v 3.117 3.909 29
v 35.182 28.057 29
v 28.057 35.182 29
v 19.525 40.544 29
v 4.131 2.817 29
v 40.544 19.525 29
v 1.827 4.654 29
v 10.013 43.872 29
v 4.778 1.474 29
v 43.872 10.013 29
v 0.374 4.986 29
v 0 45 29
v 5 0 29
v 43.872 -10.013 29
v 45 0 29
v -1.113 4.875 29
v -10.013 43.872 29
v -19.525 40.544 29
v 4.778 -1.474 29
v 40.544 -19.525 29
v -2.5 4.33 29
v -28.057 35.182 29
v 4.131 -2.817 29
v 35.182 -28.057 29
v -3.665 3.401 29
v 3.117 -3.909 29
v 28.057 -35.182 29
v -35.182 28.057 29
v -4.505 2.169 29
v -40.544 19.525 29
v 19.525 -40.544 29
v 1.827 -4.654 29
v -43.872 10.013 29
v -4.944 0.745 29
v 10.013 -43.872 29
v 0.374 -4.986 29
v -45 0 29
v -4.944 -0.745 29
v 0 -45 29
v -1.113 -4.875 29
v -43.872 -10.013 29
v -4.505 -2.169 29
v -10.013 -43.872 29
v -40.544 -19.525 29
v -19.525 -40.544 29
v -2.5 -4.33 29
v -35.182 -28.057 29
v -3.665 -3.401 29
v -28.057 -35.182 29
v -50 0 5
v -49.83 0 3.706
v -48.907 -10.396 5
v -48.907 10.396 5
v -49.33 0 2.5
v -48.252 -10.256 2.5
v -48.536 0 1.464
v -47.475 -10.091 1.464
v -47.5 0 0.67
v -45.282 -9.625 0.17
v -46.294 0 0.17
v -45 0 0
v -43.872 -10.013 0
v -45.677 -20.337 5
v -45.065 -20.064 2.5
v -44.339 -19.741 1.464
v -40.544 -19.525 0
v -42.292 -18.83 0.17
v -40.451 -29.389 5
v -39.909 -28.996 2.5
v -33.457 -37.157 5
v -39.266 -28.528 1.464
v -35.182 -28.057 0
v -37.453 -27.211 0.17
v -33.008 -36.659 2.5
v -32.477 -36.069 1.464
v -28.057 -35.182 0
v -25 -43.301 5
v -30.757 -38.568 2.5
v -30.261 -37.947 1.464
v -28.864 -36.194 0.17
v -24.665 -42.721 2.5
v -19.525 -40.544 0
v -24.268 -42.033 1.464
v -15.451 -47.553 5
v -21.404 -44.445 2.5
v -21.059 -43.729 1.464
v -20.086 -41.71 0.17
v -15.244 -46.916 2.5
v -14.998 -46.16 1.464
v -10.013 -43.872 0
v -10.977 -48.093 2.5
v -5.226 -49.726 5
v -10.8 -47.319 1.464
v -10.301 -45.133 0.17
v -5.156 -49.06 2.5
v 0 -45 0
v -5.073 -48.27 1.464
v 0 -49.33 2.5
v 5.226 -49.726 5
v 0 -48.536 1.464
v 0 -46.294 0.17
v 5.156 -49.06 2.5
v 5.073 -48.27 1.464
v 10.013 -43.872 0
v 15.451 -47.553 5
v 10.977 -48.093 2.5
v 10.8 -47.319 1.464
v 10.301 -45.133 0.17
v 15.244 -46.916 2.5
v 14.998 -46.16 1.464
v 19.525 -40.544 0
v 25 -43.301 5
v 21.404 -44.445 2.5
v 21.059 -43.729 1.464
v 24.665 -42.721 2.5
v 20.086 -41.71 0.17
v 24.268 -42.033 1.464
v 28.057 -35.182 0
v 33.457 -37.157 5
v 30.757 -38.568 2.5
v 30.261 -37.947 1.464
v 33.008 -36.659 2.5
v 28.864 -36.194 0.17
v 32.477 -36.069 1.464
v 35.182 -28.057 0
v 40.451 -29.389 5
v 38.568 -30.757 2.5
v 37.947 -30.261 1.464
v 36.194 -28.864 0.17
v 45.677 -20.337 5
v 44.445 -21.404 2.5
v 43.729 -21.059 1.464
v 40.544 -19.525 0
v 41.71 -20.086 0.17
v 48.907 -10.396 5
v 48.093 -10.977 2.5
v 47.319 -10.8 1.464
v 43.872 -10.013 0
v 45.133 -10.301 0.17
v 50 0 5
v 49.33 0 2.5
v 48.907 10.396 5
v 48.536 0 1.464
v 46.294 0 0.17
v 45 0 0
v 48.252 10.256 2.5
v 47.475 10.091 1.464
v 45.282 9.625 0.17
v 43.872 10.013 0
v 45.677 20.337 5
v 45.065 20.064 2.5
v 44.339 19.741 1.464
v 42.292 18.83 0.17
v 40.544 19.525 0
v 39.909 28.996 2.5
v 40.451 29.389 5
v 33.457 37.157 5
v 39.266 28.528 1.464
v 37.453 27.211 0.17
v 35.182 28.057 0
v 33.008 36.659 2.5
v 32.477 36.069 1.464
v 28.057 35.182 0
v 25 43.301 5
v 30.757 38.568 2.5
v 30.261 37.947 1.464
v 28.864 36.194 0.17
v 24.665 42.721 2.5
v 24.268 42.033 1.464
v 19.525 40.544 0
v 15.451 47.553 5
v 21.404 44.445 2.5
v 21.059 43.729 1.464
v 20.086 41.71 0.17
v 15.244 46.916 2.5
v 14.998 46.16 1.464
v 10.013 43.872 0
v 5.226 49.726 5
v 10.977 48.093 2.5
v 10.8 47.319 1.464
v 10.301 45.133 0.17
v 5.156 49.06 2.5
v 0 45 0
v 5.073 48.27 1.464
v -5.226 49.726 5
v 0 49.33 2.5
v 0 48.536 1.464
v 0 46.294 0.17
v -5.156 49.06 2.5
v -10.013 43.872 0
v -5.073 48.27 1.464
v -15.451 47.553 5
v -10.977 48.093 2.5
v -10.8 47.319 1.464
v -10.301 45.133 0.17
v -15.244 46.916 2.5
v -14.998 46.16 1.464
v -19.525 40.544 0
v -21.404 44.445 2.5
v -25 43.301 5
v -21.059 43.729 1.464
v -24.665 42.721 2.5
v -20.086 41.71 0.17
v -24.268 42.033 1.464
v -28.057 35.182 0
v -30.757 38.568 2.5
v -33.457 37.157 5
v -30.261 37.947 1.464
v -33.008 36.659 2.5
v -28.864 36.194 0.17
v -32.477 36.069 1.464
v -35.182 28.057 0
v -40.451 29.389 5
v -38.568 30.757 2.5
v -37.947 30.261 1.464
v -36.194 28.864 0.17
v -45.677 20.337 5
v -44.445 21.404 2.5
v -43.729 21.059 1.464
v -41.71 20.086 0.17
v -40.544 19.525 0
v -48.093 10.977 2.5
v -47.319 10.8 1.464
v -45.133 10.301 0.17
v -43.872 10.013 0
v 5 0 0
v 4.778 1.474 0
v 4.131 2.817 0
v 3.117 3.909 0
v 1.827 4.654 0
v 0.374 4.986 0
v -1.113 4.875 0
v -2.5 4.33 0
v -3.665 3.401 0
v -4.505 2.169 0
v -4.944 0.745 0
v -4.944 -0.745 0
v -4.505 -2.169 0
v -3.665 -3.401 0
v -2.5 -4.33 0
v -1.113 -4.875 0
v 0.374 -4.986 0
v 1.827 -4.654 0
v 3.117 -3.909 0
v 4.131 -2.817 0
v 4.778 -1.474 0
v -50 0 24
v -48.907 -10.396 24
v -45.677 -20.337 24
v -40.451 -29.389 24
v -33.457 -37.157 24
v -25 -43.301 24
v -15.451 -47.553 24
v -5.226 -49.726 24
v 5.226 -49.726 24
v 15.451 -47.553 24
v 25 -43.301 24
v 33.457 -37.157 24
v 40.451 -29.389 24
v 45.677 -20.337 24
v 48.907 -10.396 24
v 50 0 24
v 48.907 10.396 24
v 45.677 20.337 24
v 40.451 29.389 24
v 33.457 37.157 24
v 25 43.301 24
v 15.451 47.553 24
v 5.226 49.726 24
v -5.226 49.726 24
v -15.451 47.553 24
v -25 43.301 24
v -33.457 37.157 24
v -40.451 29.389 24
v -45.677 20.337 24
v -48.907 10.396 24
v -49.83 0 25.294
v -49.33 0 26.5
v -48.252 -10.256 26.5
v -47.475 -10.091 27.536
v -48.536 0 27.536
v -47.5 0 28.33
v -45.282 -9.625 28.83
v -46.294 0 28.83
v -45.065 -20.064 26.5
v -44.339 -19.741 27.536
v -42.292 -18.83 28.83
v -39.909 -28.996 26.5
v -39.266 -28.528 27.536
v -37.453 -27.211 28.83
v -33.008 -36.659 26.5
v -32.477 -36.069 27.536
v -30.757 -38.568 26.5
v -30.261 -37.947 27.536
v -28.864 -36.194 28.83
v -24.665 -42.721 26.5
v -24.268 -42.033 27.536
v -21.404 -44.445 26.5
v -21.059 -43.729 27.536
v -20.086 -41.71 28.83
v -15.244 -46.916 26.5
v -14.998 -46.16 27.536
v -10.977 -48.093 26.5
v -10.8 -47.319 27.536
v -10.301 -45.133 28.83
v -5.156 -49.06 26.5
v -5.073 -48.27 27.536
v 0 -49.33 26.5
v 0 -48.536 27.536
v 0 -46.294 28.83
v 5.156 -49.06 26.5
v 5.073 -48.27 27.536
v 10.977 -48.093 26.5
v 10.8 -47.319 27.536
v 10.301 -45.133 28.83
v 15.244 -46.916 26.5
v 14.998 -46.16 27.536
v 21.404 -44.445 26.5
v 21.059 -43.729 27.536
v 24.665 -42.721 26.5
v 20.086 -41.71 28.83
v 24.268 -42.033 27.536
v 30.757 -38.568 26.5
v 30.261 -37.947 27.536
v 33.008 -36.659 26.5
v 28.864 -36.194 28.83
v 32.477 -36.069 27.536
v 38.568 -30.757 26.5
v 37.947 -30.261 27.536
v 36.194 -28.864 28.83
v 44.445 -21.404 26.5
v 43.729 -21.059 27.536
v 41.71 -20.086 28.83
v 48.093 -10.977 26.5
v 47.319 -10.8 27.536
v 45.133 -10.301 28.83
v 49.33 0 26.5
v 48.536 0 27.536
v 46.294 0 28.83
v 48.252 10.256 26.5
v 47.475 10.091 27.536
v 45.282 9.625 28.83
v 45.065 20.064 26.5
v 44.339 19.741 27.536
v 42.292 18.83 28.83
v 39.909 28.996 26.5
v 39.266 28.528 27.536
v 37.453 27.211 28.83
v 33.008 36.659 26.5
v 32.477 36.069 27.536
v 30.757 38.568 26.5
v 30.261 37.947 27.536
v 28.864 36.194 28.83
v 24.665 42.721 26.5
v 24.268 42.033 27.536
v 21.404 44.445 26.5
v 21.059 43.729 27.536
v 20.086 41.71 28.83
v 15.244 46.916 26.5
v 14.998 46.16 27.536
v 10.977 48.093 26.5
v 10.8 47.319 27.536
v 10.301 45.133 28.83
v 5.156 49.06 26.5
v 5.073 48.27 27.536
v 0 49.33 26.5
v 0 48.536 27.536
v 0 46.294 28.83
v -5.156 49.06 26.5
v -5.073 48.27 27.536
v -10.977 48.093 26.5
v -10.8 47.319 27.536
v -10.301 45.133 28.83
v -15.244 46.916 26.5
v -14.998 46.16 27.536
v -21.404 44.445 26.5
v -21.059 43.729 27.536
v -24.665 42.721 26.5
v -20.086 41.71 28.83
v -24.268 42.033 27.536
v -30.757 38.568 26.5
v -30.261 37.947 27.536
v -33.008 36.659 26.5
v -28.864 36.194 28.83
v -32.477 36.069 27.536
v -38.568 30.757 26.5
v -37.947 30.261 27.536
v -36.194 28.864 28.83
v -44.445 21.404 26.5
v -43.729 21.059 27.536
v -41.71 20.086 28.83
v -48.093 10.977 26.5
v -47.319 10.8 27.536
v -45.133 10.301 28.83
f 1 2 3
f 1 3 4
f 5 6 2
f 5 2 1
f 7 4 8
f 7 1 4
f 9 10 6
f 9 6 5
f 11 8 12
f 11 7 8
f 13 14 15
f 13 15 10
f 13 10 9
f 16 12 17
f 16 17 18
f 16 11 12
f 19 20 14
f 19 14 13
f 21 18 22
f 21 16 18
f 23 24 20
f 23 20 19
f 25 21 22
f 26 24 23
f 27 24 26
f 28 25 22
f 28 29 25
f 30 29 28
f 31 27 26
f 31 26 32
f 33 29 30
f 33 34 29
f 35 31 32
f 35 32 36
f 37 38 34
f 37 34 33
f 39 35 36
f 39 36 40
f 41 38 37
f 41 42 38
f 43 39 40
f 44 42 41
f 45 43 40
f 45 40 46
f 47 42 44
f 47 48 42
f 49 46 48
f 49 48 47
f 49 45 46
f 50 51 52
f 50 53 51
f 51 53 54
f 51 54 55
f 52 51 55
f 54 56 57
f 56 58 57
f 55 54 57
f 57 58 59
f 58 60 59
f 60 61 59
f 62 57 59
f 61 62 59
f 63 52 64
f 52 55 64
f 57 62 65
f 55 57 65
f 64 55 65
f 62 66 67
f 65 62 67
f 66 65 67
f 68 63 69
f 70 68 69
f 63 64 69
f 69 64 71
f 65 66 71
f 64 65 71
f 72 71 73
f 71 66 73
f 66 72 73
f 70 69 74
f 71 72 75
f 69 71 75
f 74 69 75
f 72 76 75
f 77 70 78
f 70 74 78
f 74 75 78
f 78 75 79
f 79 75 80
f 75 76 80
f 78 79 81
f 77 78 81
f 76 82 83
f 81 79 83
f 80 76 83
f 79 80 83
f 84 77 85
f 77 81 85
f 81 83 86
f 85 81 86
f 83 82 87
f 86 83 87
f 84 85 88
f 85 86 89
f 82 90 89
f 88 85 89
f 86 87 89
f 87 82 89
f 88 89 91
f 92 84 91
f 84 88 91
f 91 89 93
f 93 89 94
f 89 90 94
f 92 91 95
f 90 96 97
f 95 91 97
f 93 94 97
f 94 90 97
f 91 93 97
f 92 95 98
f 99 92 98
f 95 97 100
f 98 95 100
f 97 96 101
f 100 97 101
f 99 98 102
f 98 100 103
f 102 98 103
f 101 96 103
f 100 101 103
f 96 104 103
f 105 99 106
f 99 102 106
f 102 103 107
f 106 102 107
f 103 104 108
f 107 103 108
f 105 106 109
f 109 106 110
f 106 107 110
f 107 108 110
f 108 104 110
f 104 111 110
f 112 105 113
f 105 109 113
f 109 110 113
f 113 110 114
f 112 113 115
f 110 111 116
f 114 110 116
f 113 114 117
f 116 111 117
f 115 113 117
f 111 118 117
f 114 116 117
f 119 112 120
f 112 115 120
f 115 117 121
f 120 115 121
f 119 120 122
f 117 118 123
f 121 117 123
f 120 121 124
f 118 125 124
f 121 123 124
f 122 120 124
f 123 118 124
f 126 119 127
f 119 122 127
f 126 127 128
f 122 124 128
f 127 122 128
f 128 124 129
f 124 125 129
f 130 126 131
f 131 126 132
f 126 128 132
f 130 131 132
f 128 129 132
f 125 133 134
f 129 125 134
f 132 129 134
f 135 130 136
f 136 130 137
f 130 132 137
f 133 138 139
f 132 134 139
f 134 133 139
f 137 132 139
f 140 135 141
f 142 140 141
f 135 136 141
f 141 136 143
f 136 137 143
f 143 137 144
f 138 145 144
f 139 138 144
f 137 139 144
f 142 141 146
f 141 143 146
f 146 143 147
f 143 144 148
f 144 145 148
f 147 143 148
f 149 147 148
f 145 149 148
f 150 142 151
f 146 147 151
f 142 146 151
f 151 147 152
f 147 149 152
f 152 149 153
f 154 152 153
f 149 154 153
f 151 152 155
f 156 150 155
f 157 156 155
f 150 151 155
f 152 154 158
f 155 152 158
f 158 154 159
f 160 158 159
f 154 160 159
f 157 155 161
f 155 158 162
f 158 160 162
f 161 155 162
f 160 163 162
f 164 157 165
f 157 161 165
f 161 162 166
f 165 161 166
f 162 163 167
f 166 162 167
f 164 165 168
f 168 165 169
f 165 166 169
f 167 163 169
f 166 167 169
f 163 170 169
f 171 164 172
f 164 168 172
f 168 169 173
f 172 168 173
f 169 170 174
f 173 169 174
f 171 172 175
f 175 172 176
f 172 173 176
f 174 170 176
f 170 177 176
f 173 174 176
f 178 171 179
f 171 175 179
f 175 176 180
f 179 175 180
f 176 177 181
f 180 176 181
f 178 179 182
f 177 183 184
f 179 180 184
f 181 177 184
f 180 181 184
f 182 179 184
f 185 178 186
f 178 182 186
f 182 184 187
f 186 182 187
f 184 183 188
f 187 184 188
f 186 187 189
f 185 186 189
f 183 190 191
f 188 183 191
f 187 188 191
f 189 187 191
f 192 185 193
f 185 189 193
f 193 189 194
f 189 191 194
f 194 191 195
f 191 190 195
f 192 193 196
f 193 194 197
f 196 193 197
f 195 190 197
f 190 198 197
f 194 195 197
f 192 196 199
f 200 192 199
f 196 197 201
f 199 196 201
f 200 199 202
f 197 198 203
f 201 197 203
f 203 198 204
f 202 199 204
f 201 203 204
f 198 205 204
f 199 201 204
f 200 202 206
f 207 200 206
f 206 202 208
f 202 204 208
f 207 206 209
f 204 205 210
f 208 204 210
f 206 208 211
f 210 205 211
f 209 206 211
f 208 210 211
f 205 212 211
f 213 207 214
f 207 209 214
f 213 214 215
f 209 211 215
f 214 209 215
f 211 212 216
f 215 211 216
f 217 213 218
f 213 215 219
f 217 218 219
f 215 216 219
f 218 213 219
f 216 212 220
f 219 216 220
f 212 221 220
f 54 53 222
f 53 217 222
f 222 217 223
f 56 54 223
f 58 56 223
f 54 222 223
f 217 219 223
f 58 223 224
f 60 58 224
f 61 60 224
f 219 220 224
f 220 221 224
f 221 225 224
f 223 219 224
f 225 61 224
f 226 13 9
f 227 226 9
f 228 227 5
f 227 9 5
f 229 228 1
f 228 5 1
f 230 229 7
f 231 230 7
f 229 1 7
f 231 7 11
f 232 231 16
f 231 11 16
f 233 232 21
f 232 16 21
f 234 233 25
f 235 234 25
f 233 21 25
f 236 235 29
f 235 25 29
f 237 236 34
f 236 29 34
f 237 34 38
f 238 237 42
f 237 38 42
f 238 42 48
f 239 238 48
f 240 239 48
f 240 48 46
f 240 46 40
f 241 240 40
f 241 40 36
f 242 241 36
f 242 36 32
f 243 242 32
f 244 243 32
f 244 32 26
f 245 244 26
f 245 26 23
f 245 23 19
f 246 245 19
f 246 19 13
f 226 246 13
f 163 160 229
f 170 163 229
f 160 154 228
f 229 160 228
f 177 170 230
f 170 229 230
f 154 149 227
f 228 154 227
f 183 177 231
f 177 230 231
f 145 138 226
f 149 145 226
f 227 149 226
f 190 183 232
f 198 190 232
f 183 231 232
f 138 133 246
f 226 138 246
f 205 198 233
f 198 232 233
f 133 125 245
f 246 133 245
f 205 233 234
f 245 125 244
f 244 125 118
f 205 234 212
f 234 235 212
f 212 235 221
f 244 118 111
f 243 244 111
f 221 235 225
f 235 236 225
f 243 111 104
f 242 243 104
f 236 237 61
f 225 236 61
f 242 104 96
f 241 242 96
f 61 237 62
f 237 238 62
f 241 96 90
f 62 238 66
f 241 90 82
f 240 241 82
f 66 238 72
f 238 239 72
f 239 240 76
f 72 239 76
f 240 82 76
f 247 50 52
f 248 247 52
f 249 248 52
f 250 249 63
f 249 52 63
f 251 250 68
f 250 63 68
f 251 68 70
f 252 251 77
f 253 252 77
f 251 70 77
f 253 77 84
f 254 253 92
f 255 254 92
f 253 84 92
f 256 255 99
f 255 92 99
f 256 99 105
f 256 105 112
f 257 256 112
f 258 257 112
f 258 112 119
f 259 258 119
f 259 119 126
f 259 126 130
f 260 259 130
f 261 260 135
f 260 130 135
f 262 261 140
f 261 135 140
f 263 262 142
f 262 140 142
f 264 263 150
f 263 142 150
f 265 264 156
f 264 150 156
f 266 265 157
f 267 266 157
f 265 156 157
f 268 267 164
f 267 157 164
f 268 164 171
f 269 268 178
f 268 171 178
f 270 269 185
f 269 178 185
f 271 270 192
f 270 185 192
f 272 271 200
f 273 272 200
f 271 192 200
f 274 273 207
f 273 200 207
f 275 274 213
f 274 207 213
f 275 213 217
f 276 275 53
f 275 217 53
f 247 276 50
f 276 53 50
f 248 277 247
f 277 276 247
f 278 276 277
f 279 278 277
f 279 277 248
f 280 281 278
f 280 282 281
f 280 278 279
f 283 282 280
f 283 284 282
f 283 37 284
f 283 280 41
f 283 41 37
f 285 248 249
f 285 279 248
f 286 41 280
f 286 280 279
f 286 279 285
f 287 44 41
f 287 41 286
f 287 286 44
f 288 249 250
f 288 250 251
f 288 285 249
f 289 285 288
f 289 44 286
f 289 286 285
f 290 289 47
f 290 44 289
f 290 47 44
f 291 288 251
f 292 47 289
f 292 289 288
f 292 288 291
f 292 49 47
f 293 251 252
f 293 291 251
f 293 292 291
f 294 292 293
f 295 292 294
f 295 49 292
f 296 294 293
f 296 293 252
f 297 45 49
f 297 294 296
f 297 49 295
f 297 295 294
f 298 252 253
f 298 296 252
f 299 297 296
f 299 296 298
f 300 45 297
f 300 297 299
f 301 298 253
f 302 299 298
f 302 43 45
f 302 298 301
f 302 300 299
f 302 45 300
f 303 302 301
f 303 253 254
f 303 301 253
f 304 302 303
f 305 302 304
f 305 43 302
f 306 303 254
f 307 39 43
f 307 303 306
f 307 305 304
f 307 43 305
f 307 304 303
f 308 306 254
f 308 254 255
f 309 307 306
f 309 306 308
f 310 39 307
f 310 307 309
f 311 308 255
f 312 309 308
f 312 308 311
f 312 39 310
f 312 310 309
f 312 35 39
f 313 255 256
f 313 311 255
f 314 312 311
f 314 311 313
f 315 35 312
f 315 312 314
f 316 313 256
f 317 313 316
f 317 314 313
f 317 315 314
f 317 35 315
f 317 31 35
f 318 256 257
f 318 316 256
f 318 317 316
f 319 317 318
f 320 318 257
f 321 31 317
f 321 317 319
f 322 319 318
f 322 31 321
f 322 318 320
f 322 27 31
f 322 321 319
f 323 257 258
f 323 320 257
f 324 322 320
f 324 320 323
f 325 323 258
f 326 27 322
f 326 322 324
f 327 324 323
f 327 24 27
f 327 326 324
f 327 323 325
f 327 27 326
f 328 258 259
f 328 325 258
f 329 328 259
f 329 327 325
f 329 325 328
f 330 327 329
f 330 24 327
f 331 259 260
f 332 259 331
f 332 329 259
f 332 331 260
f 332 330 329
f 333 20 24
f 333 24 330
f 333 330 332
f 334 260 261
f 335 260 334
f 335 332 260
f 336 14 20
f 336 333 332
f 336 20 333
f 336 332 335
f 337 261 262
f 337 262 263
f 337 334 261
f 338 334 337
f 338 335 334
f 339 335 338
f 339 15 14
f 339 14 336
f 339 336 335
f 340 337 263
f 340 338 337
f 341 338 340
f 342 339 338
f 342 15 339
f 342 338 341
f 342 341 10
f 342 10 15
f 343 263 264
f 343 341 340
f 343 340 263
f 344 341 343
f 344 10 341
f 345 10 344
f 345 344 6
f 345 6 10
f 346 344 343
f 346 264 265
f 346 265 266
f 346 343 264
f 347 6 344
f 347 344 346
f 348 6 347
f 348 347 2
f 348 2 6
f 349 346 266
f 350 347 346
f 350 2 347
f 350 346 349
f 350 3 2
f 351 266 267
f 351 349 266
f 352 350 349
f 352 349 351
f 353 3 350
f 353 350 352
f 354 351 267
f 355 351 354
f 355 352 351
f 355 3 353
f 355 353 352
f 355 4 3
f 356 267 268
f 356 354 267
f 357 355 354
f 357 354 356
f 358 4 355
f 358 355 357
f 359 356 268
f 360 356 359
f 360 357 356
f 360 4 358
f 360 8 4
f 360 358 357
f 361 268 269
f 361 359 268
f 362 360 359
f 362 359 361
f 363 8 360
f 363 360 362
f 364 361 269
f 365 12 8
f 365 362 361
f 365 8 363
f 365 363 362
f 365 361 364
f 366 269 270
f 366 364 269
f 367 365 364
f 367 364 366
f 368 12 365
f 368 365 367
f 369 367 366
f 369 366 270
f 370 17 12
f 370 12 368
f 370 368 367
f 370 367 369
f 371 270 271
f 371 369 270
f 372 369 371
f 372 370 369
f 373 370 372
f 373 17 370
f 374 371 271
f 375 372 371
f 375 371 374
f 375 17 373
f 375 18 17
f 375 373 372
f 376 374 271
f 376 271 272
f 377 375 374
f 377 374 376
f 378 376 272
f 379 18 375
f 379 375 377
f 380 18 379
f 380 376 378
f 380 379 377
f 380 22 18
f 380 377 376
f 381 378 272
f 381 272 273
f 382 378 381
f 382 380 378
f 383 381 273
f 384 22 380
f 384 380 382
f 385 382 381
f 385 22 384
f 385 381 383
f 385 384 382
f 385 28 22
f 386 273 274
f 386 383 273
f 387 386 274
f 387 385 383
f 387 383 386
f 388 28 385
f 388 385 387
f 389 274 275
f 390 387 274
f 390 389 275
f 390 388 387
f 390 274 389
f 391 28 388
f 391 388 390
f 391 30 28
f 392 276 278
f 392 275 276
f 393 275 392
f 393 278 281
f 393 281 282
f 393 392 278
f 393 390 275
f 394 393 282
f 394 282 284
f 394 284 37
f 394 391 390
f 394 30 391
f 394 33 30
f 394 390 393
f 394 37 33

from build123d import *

# Parameters (mm, degrees)
SKETCH_1_R          = 50
EXTRUDE_1_DEPTH     = 29
SKETCH_2_R          = 5
CUT_EXTRUDE_1_DEPTH = 77.426435217
FILLET_1_R          = 5


with BuildPart() as part:
    # 草图1 → 凸台-拉伸1 (new body)
    with BuildSketch(Plane.XY):
        with Locations(Location((0, 0, 0), (0, 0, 180))):
            Circle(SKETCH_1_R)
    extrude(amount=EXTRUDE_1_DEPTH)

    # 草图2 → 切除-拉伸1 (cut, through all)
    with BuildSketch(Plane.XY.offset(29)):
        Circle(SKETCH_2_R)
    extrude(amount=-CUT_EXTRUDE_1_DEPTH, mode=Mode.SUBTRACT)

    # 圆角1
    fillet_1_edges = [part.edges().sort_by_distance(p)[0] for p in [
        (50, 0, 0),
        (50, 0, 29),
    ]]
    fillet(fillet_1_edges, radius=FILLET_1_R)


solid = part.part
